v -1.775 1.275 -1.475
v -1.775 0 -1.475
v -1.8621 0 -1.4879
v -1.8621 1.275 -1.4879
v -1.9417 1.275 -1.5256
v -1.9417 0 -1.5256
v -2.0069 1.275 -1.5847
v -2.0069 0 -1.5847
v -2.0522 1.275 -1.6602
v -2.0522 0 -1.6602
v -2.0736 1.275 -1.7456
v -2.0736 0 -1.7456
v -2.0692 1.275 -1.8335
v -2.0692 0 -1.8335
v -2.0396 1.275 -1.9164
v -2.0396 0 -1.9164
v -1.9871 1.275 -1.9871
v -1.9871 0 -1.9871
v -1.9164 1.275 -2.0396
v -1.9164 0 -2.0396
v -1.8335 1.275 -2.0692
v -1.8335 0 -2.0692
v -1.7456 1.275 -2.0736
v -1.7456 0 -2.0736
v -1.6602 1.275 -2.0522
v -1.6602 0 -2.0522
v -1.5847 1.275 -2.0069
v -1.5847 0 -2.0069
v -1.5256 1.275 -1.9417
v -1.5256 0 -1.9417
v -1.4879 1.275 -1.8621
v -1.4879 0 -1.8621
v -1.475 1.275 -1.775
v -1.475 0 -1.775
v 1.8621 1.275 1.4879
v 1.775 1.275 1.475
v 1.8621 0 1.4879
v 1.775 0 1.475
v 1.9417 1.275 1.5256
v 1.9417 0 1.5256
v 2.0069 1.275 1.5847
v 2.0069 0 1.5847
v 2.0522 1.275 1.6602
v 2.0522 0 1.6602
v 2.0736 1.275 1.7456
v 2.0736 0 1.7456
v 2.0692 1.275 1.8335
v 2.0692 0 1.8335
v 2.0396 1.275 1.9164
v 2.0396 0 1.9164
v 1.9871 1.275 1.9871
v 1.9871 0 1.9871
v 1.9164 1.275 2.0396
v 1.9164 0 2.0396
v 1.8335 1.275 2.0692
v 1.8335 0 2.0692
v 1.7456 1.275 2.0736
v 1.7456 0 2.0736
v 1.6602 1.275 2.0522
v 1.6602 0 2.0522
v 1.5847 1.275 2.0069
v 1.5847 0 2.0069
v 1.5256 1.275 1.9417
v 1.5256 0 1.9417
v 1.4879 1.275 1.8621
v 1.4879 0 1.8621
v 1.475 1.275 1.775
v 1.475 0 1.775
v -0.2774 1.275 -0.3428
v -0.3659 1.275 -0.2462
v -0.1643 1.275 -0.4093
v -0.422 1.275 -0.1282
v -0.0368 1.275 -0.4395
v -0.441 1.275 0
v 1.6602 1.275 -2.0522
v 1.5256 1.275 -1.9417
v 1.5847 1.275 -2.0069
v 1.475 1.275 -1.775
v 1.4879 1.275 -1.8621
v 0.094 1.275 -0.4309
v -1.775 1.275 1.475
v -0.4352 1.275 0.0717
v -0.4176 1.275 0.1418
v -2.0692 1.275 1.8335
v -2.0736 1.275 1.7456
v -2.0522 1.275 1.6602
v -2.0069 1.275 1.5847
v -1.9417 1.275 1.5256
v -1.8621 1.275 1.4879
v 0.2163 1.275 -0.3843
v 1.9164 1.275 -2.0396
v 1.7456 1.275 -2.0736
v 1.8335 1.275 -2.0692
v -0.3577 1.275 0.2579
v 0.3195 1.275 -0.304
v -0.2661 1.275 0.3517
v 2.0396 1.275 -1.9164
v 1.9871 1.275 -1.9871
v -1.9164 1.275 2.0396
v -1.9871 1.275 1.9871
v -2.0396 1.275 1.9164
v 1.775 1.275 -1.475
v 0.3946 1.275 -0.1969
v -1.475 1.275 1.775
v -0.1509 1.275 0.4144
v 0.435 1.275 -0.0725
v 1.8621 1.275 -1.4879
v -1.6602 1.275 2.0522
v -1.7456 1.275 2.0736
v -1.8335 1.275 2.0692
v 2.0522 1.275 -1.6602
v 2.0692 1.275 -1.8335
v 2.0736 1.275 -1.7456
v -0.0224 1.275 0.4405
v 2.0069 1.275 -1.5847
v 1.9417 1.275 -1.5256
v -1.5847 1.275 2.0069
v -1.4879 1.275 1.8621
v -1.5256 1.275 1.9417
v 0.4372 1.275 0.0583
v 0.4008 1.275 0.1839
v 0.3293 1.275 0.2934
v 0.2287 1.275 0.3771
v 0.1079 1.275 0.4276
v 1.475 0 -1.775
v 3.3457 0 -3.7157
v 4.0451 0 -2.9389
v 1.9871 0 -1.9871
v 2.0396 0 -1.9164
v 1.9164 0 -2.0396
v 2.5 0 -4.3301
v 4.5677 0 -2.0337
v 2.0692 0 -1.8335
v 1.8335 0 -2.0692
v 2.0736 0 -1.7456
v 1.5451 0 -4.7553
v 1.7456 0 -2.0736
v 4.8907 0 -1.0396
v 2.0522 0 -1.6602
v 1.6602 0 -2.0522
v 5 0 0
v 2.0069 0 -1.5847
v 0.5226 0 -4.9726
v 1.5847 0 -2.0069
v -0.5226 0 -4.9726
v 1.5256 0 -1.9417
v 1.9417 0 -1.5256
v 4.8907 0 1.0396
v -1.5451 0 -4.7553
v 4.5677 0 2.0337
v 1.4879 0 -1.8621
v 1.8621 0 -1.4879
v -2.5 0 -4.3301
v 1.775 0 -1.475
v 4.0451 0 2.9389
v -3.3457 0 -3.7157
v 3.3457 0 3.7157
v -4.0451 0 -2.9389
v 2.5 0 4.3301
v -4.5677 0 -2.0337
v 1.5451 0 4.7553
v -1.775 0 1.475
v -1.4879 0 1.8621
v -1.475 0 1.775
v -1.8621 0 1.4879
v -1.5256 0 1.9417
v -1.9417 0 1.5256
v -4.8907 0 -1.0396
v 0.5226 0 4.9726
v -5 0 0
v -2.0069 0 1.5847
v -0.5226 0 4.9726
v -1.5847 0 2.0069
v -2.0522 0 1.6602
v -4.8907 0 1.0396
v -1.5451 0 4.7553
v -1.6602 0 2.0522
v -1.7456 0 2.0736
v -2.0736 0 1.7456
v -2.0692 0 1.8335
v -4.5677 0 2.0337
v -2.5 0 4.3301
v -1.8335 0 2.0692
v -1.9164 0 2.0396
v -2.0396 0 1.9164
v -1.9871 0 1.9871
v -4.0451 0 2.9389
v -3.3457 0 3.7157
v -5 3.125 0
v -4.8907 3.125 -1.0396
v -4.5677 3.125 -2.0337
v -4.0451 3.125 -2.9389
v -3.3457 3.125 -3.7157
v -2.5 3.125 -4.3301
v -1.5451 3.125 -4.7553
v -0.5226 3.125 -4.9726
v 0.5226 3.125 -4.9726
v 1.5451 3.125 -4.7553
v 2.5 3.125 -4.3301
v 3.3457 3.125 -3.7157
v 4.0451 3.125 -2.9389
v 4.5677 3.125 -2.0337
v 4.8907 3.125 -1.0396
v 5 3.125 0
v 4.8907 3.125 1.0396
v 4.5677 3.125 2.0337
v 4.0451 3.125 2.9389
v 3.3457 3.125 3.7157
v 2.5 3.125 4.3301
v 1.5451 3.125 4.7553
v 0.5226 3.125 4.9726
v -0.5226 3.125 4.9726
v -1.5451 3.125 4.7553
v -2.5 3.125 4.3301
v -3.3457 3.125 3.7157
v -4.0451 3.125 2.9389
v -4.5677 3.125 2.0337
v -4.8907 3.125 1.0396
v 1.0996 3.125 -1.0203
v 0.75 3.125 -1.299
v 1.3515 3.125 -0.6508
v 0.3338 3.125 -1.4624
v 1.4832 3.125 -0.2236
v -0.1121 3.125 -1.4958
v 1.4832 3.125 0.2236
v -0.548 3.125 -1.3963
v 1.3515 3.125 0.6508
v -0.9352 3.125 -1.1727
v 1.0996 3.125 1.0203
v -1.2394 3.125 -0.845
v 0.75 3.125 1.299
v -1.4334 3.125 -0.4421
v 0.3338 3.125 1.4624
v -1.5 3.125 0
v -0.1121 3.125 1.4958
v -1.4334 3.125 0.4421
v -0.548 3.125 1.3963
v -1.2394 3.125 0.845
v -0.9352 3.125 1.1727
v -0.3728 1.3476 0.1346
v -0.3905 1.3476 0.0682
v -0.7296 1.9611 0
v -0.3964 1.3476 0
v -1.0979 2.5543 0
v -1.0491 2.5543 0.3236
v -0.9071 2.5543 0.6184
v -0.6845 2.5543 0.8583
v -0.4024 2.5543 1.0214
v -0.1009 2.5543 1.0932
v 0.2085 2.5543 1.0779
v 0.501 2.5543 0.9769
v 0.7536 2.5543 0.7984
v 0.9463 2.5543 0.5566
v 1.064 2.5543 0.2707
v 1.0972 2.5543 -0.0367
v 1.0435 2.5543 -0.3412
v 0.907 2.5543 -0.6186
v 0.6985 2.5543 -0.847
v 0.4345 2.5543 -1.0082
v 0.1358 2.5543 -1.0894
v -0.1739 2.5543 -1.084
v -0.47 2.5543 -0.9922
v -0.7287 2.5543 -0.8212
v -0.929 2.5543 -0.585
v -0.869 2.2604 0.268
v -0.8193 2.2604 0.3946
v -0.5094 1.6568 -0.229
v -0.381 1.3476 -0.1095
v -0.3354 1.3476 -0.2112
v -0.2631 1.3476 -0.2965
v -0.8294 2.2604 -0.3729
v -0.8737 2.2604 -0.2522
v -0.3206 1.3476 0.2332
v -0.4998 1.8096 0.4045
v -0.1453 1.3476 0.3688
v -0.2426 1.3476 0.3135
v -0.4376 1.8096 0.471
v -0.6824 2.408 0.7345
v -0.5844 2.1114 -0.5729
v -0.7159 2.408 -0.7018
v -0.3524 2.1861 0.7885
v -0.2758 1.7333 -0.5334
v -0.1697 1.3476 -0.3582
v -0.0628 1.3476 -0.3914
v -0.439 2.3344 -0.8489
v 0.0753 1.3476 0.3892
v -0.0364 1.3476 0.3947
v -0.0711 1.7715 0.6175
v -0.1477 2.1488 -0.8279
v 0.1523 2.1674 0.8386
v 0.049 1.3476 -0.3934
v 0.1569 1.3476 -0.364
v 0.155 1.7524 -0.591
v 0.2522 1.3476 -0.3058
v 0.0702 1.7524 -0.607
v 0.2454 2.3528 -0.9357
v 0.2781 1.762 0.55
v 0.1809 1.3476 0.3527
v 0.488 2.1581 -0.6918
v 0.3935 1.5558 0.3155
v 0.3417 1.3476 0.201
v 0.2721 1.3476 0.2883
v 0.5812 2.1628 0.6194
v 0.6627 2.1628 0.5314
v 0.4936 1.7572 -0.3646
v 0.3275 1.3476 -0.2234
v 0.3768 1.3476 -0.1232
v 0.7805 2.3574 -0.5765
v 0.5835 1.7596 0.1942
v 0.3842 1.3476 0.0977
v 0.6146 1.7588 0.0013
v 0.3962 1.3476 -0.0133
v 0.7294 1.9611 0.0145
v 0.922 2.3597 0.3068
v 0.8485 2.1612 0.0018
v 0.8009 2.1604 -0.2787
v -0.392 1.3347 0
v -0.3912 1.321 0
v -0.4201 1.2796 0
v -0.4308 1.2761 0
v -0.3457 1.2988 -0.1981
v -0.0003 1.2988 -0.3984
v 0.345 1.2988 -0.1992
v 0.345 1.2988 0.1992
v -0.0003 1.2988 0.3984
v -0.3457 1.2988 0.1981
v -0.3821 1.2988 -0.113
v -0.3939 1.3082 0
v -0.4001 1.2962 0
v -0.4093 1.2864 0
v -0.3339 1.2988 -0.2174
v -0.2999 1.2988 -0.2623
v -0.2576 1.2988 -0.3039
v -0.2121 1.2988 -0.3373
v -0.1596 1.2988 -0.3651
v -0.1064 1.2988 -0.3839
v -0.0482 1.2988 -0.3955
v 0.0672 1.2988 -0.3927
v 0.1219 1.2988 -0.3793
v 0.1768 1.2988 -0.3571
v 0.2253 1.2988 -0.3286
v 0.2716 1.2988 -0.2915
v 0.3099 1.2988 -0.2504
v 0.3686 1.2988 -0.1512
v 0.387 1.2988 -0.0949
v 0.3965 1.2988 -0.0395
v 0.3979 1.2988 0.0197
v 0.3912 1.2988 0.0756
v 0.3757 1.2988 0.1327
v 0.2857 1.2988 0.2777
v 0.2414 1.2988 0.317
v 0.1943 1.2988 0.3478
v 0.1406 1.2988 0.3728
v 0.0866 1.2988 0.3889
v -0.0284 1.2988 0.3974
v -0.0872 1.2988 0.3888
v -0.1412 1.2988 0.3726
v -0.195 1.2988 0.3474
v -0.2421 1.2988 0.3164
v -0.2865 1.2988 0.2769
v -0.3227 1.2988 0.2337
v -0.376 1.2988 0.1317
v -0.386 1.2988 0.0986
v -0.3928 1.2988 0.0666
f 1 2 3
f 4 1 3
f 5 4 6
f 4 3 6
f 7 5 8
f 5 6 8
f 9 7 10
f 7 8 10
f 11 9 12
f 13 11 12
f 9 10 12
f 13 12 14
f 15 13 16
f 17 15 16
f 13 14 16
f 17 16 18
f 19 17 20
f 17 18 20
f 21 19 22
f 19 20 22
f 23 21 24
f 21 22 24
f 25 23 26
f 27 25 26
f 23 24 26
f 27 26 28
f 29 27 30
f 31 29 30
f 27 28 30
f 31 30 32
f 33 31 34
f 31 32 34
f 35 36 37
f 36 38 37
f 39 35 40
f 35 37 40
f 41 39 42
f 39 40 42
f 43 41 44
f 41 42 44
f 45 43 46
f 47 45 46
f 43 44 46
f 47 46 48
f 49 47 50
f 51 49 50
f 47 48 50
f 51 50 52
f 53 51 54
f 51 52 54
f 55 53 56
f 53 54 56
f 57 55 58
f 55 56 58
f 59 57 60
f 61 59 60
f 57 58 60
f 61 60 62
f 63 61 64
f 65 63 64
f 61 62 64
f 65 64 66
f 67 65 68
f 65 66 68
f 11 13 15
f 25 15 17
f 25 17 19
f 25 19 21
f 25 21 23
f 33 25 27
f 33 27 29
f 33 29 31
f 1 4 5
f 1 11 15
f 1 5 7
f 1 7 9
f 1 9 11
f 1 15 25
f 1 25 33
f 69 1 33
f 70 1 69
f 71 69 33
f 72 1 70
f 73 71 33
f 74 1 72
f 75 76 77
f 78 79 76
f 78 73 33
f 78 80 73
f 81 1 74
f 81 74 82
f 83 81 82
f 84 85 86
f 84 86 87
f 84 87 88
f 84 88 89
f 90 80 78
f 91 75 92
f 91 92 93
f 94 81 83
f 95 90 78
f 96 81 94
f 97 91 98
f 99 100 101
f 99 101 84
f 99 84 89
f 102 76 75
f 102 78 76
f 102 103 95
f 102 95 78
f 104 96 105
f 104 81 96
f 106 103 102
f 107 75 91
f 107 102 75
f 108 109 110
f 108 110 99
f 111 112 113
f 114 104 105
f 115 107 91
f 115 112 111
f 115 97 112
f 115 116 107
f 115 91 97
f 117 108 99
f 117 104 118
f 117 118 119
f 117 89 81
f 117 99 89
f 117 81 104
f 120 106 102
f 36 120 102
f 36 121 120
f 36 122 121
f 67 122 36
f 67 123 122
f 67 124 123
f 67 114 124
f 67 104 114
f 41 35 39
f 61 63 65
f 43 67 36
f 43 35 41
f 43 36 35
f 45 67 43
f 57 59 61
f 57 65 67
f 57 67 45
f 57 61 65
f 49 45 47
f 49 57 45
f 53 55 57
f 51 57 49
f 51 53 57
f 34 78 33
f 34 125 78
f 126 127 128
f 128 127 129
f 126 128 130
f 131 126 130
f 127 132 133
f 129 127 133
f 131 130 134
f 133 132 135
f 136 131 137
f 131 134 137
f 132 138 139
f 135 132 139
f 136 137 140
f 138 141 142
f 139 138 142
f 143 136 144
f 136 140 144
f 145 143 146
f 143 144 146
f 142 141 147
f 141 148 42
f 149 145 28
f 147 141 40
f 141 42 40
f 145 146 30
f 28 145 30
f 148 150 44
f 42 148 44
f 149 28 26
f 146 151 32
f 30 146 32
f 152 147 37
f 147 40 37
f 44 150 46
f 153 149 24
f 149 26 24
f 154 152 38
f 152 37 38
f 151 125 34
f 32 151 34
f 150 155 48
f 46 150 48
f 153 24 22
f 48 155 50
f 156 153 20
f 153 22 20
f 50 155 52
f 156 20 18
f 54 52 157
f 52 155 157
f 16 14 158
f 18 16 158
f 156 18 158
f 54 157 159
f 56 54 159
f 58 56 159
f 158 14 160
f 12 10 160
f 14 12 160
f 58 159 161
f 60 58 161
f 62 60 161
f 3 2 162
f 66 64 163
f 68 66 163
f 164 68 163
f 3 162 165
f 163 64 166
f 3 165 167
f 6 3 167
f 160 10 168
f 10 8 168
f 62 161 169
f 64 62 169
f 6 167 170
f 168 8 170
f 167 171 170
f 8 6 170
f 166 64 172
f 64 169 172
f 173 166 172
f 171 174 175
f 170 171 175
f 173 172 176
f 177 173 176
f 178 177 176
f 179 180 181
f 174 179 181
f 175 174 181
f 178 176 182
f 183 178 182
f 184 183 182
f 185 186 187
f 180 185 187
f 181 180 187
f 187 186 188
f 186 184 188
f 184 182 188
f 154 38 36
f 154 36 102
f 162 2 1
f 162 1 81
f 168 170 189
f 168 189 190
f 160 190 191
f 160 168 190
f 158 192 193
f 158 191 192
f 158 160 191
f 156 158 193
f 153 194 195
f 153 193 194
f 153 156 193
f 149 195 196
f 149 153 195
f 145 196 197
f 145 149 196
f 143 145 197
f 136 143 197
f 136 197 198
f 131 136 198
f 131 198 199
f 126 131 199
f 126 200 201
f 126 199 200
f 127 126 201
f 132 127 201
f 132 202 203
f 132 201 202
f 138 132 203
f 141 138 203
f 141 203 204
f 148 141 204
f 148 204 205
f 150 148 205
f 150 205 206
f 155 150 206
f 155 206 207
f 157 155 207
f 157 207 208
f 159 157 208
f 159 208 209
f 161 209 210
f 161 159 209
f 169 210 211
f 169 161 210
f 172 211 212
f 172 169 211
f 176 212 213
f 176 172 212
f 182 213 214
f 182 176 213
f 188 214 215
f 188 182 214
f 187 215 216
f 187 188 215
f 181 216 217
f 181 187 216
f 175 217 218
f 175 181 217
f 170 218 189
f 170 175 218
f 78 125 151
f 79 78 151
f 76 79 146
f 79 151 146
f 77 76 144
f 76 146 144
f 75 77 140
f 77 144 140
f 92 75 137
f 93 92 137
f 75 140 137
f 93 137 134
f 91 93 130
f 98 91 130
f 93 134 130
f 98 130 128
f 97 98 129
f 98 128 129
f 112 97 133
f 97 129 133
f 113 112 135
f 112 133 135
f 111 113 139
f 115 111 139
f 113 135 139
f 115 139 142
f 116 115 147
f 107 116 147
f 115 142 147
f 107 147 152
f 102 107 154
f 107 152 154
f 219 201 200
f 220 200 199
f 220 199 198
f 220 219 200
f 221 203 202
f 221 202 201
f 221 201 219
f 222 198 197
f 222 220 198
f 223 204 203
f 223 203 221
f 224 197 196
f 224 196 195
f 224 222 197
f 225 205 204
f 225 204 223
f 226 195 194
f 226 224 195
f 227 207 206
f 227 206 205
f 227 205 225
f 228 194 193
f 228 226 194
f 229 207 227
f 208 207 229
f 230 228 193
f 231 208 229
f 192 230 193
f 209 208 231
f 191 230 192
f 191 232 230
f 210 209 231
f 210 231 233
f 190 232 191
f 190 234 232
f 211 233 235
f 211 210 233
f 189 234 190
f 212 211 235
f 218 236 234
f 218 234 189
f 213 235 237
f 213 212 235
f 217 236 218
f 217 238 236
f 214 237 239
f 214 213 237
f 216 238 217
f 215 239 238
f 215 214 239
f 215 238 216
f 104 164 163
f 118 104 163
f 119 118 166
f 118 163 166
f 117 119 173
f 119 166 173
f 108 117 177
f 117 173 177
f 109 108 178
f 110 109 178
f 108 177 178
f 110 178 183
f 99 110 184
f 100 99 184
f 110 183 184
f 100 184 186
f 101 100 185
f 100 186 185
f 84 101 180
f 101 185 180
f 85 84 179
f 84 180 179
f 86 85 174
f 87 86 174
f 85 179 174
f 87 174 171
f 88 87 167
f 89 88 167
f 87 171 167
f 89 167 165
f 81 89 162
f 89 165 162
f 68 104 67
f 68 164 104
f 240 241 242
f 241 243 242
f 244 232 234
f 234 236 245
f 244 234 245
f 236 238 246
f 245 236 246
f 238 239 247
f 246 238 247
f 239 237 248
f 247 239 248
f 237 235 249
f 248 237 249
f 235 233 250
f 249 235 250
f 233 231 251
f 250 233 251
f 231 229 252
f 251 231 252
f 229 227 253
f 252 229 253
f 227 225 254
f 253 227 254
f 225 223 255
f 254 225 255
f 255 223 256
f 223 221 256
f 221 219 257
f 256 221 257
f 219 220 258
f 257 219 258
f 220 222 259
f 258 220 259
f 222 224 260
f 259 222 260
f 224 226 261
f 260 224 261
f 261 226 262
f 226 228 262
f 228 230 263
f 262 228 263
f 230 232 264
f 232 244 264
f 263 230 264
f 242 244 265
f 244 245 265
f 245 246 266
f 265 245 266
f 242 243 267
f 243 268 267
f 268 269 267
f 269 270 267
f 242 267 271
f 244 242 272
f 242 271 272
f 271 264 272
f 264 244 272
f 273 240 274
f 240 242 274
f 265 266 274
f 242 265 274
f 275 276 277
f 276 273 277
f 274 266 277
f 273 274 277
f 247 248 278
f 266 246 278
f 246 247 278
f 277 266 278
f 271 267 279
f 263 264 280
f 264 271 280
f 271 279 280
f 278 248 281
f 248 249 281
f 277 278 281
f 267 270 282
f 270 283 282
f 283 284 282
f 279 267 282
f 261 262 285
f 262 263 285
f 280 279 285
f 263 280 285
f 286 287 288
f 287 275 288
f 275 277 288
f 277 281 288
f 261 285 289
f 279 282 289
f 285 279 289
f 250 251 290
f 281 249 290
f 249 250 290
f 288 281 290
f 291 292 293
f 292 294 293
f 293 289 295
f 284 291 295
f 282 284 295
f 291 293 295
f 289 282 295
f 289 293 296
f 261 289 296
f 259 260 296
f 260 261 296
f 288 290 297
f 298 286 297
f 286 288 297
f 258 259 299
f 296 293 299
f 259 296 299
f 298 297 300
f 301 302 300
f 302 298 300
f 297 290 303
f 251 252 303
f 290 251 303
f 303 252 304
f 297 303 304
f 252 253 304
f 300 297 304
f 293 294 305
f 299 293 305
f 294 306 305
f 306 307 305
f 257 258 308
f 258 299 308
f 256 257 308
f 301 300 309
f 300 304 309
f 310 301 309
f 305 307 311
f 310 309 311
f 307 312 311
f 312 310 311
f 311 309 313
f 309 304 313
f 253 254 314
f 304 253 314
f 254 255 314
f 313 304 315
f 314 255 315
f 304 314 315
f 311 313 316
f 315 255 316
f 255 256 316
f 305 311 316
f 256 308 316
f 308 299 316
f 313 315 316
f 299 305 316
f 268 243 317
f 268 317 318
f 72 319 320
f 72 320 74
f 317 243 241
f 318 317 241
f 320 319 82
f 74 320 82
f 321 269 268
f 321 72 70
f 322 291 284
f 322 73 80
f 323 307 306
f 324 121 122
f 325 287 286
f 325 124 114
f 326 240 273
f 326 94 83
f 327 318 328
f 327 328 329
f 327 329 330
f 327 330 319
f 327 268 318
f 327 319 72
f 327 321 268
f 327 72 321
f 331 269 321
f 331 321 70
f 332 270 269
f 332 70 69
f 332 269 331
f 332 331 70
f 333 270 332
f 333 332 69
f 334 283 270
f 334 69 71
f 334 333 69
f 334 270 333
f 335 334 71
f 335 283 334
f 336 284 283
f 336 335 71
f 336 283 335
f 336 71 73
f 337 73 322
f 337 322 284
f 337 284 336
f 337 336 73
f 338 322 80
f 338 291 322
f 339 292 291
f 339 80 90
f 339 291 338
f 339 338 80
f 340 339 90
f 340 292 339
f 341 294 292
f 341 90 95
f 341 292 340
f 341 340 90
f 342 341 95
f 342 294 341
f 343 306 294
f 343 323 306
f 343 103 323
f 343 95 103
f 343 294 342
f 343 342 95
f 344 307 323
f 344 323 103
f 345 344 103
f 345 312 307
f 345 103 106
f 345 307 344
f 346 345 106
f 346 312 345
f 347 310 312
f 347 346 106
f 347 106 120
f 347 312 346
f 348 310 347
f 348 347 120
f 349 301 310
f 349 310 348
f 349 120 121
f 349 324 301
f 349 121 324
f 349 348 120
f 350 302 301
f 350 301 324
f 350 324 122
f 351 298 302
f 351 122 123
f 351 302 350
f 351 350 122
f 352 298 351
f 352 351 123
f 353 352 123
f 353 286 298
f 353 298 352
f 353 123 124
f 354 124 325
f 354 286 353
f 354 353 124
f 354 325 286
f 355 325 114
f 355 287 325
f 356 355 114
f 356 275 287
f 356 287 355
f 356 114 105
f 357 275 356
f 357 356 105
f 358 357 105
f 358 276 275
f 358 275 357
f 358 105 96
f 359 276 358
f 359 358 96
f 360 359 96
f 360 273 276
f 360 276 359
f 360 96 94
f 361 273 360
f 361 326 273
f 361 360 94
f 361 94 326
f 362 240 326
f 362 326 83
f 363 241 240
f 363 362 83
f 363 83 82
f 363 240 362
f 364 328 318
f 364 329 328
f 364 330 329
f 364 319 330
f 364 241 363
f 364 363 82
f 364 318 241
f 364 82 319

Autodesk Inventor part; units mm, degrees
ref_plane "YZ Plane" through (0, 0, 0) normal (1, 0, 0) x (0, 1, 0)
ref_plane "XZ Plane" through (0, 0, 0) normal (0, 1, 0) x (-1, 0, 0)
ref_plane "XY Plane" through (0, 0, 0) normal (0, 0, 1) x (1, 0, 0)
sketch "Sketch1" plane through (0, 0, 0) normal (0, 1, 0) x (-1, 0, 0)
  circle A0 centre (0, 0) radius 0.36
  circle A1 centre (0, 0) radius 5
  dimension "d0" = 0.72
  dimension "d2" = 10
extrude "Extrusion1" add sketch "Sketch1" along normal blind 3.125
sketch "Sketch2" plane through (0, 3.125, 0) normal (0, 1, 0) x (1, 0, 0)
  circle A0 centre (0, 0) radius 1.5
  dimension "d10" = 3
sketch "Sketch3" plane through (0, 0, 0) normal (0, -1, 0) x (1, 0, 0)
  line L0 (-1.775, 1.775) -> (1.775, 1.775)
  line L1 (1.775, 1.775) -> (1.775, -1.775)
  line L2 (1.775, -1.775) -> (-1.775, -1.775)
  line L3 (-1.775, -1.775) -> (-1.775, 1.775)
  line L4 (-1.775, 1.775) -> (1.775, -1.775) construction
  line L5 (1.775, 1.775) -> (-1.775, -1.775) construction
  arc A0 (1.775, 1.475) -> (1.475, 1.775) centre (1.775, 1.775) ccw
  arc A1 (1.475, -1.775) -> (1.775, -1.475) centre (1.775, -1.775) ccw
  arc A2 (-1.775, -1.475) -> (-1.475, -1.775) centre (-1.775, -1.775) ccw
  arc A3 (-1.475, 1.775) -> (-1.775, 1.475) centre (-1.775, 1.775) ccw
  point P0 (0, 0)
  dimension "d11" = 0.3
  dimension "d13" = 3.55
extrude "Extrusion2" cut sketch "Sketch3" against normal blind 1.275
sketch "Sketch5" plane through (0, 0, 0) normal (0, 0, 1) x (1, 0, 0)
  line L0 (-0.36, 1.275) -> (0.36, 1.275) projected
  line L1 (5, 3.125) -> (-5, 3.125) projected
  arc A0 (-0.36, 1.275) -> (-1.5, 3.125) centre (-11.1041, -4.0695) ccw
  line L2 (0, 1.275) -> (0, 3.125)
  line L3 (0.36, 1.275) -> (0, 1.275)
  line L4 (0.36, 3.125) -> (0.36, 1.275) projected
  line L5 (0.36, 3.125) -> (-1.5, 3.125)
  point P0 (0, 0)
  dimension "d17" = 1.5
  dimension "d23" = 12
revolve "Revolution1" cut sketch "Sketch5" angle 360 about axis through (0, 1.275, 0) along (0, 1, 0) contours A0 L1 L2 L0
fillet "Fillet1" radius 0.05 1 edges at (0.36, 1.275, 0)
equation "\"d17\" = 0.5 * d10"
properties part number "Acoustic Horn 45deg V1"
